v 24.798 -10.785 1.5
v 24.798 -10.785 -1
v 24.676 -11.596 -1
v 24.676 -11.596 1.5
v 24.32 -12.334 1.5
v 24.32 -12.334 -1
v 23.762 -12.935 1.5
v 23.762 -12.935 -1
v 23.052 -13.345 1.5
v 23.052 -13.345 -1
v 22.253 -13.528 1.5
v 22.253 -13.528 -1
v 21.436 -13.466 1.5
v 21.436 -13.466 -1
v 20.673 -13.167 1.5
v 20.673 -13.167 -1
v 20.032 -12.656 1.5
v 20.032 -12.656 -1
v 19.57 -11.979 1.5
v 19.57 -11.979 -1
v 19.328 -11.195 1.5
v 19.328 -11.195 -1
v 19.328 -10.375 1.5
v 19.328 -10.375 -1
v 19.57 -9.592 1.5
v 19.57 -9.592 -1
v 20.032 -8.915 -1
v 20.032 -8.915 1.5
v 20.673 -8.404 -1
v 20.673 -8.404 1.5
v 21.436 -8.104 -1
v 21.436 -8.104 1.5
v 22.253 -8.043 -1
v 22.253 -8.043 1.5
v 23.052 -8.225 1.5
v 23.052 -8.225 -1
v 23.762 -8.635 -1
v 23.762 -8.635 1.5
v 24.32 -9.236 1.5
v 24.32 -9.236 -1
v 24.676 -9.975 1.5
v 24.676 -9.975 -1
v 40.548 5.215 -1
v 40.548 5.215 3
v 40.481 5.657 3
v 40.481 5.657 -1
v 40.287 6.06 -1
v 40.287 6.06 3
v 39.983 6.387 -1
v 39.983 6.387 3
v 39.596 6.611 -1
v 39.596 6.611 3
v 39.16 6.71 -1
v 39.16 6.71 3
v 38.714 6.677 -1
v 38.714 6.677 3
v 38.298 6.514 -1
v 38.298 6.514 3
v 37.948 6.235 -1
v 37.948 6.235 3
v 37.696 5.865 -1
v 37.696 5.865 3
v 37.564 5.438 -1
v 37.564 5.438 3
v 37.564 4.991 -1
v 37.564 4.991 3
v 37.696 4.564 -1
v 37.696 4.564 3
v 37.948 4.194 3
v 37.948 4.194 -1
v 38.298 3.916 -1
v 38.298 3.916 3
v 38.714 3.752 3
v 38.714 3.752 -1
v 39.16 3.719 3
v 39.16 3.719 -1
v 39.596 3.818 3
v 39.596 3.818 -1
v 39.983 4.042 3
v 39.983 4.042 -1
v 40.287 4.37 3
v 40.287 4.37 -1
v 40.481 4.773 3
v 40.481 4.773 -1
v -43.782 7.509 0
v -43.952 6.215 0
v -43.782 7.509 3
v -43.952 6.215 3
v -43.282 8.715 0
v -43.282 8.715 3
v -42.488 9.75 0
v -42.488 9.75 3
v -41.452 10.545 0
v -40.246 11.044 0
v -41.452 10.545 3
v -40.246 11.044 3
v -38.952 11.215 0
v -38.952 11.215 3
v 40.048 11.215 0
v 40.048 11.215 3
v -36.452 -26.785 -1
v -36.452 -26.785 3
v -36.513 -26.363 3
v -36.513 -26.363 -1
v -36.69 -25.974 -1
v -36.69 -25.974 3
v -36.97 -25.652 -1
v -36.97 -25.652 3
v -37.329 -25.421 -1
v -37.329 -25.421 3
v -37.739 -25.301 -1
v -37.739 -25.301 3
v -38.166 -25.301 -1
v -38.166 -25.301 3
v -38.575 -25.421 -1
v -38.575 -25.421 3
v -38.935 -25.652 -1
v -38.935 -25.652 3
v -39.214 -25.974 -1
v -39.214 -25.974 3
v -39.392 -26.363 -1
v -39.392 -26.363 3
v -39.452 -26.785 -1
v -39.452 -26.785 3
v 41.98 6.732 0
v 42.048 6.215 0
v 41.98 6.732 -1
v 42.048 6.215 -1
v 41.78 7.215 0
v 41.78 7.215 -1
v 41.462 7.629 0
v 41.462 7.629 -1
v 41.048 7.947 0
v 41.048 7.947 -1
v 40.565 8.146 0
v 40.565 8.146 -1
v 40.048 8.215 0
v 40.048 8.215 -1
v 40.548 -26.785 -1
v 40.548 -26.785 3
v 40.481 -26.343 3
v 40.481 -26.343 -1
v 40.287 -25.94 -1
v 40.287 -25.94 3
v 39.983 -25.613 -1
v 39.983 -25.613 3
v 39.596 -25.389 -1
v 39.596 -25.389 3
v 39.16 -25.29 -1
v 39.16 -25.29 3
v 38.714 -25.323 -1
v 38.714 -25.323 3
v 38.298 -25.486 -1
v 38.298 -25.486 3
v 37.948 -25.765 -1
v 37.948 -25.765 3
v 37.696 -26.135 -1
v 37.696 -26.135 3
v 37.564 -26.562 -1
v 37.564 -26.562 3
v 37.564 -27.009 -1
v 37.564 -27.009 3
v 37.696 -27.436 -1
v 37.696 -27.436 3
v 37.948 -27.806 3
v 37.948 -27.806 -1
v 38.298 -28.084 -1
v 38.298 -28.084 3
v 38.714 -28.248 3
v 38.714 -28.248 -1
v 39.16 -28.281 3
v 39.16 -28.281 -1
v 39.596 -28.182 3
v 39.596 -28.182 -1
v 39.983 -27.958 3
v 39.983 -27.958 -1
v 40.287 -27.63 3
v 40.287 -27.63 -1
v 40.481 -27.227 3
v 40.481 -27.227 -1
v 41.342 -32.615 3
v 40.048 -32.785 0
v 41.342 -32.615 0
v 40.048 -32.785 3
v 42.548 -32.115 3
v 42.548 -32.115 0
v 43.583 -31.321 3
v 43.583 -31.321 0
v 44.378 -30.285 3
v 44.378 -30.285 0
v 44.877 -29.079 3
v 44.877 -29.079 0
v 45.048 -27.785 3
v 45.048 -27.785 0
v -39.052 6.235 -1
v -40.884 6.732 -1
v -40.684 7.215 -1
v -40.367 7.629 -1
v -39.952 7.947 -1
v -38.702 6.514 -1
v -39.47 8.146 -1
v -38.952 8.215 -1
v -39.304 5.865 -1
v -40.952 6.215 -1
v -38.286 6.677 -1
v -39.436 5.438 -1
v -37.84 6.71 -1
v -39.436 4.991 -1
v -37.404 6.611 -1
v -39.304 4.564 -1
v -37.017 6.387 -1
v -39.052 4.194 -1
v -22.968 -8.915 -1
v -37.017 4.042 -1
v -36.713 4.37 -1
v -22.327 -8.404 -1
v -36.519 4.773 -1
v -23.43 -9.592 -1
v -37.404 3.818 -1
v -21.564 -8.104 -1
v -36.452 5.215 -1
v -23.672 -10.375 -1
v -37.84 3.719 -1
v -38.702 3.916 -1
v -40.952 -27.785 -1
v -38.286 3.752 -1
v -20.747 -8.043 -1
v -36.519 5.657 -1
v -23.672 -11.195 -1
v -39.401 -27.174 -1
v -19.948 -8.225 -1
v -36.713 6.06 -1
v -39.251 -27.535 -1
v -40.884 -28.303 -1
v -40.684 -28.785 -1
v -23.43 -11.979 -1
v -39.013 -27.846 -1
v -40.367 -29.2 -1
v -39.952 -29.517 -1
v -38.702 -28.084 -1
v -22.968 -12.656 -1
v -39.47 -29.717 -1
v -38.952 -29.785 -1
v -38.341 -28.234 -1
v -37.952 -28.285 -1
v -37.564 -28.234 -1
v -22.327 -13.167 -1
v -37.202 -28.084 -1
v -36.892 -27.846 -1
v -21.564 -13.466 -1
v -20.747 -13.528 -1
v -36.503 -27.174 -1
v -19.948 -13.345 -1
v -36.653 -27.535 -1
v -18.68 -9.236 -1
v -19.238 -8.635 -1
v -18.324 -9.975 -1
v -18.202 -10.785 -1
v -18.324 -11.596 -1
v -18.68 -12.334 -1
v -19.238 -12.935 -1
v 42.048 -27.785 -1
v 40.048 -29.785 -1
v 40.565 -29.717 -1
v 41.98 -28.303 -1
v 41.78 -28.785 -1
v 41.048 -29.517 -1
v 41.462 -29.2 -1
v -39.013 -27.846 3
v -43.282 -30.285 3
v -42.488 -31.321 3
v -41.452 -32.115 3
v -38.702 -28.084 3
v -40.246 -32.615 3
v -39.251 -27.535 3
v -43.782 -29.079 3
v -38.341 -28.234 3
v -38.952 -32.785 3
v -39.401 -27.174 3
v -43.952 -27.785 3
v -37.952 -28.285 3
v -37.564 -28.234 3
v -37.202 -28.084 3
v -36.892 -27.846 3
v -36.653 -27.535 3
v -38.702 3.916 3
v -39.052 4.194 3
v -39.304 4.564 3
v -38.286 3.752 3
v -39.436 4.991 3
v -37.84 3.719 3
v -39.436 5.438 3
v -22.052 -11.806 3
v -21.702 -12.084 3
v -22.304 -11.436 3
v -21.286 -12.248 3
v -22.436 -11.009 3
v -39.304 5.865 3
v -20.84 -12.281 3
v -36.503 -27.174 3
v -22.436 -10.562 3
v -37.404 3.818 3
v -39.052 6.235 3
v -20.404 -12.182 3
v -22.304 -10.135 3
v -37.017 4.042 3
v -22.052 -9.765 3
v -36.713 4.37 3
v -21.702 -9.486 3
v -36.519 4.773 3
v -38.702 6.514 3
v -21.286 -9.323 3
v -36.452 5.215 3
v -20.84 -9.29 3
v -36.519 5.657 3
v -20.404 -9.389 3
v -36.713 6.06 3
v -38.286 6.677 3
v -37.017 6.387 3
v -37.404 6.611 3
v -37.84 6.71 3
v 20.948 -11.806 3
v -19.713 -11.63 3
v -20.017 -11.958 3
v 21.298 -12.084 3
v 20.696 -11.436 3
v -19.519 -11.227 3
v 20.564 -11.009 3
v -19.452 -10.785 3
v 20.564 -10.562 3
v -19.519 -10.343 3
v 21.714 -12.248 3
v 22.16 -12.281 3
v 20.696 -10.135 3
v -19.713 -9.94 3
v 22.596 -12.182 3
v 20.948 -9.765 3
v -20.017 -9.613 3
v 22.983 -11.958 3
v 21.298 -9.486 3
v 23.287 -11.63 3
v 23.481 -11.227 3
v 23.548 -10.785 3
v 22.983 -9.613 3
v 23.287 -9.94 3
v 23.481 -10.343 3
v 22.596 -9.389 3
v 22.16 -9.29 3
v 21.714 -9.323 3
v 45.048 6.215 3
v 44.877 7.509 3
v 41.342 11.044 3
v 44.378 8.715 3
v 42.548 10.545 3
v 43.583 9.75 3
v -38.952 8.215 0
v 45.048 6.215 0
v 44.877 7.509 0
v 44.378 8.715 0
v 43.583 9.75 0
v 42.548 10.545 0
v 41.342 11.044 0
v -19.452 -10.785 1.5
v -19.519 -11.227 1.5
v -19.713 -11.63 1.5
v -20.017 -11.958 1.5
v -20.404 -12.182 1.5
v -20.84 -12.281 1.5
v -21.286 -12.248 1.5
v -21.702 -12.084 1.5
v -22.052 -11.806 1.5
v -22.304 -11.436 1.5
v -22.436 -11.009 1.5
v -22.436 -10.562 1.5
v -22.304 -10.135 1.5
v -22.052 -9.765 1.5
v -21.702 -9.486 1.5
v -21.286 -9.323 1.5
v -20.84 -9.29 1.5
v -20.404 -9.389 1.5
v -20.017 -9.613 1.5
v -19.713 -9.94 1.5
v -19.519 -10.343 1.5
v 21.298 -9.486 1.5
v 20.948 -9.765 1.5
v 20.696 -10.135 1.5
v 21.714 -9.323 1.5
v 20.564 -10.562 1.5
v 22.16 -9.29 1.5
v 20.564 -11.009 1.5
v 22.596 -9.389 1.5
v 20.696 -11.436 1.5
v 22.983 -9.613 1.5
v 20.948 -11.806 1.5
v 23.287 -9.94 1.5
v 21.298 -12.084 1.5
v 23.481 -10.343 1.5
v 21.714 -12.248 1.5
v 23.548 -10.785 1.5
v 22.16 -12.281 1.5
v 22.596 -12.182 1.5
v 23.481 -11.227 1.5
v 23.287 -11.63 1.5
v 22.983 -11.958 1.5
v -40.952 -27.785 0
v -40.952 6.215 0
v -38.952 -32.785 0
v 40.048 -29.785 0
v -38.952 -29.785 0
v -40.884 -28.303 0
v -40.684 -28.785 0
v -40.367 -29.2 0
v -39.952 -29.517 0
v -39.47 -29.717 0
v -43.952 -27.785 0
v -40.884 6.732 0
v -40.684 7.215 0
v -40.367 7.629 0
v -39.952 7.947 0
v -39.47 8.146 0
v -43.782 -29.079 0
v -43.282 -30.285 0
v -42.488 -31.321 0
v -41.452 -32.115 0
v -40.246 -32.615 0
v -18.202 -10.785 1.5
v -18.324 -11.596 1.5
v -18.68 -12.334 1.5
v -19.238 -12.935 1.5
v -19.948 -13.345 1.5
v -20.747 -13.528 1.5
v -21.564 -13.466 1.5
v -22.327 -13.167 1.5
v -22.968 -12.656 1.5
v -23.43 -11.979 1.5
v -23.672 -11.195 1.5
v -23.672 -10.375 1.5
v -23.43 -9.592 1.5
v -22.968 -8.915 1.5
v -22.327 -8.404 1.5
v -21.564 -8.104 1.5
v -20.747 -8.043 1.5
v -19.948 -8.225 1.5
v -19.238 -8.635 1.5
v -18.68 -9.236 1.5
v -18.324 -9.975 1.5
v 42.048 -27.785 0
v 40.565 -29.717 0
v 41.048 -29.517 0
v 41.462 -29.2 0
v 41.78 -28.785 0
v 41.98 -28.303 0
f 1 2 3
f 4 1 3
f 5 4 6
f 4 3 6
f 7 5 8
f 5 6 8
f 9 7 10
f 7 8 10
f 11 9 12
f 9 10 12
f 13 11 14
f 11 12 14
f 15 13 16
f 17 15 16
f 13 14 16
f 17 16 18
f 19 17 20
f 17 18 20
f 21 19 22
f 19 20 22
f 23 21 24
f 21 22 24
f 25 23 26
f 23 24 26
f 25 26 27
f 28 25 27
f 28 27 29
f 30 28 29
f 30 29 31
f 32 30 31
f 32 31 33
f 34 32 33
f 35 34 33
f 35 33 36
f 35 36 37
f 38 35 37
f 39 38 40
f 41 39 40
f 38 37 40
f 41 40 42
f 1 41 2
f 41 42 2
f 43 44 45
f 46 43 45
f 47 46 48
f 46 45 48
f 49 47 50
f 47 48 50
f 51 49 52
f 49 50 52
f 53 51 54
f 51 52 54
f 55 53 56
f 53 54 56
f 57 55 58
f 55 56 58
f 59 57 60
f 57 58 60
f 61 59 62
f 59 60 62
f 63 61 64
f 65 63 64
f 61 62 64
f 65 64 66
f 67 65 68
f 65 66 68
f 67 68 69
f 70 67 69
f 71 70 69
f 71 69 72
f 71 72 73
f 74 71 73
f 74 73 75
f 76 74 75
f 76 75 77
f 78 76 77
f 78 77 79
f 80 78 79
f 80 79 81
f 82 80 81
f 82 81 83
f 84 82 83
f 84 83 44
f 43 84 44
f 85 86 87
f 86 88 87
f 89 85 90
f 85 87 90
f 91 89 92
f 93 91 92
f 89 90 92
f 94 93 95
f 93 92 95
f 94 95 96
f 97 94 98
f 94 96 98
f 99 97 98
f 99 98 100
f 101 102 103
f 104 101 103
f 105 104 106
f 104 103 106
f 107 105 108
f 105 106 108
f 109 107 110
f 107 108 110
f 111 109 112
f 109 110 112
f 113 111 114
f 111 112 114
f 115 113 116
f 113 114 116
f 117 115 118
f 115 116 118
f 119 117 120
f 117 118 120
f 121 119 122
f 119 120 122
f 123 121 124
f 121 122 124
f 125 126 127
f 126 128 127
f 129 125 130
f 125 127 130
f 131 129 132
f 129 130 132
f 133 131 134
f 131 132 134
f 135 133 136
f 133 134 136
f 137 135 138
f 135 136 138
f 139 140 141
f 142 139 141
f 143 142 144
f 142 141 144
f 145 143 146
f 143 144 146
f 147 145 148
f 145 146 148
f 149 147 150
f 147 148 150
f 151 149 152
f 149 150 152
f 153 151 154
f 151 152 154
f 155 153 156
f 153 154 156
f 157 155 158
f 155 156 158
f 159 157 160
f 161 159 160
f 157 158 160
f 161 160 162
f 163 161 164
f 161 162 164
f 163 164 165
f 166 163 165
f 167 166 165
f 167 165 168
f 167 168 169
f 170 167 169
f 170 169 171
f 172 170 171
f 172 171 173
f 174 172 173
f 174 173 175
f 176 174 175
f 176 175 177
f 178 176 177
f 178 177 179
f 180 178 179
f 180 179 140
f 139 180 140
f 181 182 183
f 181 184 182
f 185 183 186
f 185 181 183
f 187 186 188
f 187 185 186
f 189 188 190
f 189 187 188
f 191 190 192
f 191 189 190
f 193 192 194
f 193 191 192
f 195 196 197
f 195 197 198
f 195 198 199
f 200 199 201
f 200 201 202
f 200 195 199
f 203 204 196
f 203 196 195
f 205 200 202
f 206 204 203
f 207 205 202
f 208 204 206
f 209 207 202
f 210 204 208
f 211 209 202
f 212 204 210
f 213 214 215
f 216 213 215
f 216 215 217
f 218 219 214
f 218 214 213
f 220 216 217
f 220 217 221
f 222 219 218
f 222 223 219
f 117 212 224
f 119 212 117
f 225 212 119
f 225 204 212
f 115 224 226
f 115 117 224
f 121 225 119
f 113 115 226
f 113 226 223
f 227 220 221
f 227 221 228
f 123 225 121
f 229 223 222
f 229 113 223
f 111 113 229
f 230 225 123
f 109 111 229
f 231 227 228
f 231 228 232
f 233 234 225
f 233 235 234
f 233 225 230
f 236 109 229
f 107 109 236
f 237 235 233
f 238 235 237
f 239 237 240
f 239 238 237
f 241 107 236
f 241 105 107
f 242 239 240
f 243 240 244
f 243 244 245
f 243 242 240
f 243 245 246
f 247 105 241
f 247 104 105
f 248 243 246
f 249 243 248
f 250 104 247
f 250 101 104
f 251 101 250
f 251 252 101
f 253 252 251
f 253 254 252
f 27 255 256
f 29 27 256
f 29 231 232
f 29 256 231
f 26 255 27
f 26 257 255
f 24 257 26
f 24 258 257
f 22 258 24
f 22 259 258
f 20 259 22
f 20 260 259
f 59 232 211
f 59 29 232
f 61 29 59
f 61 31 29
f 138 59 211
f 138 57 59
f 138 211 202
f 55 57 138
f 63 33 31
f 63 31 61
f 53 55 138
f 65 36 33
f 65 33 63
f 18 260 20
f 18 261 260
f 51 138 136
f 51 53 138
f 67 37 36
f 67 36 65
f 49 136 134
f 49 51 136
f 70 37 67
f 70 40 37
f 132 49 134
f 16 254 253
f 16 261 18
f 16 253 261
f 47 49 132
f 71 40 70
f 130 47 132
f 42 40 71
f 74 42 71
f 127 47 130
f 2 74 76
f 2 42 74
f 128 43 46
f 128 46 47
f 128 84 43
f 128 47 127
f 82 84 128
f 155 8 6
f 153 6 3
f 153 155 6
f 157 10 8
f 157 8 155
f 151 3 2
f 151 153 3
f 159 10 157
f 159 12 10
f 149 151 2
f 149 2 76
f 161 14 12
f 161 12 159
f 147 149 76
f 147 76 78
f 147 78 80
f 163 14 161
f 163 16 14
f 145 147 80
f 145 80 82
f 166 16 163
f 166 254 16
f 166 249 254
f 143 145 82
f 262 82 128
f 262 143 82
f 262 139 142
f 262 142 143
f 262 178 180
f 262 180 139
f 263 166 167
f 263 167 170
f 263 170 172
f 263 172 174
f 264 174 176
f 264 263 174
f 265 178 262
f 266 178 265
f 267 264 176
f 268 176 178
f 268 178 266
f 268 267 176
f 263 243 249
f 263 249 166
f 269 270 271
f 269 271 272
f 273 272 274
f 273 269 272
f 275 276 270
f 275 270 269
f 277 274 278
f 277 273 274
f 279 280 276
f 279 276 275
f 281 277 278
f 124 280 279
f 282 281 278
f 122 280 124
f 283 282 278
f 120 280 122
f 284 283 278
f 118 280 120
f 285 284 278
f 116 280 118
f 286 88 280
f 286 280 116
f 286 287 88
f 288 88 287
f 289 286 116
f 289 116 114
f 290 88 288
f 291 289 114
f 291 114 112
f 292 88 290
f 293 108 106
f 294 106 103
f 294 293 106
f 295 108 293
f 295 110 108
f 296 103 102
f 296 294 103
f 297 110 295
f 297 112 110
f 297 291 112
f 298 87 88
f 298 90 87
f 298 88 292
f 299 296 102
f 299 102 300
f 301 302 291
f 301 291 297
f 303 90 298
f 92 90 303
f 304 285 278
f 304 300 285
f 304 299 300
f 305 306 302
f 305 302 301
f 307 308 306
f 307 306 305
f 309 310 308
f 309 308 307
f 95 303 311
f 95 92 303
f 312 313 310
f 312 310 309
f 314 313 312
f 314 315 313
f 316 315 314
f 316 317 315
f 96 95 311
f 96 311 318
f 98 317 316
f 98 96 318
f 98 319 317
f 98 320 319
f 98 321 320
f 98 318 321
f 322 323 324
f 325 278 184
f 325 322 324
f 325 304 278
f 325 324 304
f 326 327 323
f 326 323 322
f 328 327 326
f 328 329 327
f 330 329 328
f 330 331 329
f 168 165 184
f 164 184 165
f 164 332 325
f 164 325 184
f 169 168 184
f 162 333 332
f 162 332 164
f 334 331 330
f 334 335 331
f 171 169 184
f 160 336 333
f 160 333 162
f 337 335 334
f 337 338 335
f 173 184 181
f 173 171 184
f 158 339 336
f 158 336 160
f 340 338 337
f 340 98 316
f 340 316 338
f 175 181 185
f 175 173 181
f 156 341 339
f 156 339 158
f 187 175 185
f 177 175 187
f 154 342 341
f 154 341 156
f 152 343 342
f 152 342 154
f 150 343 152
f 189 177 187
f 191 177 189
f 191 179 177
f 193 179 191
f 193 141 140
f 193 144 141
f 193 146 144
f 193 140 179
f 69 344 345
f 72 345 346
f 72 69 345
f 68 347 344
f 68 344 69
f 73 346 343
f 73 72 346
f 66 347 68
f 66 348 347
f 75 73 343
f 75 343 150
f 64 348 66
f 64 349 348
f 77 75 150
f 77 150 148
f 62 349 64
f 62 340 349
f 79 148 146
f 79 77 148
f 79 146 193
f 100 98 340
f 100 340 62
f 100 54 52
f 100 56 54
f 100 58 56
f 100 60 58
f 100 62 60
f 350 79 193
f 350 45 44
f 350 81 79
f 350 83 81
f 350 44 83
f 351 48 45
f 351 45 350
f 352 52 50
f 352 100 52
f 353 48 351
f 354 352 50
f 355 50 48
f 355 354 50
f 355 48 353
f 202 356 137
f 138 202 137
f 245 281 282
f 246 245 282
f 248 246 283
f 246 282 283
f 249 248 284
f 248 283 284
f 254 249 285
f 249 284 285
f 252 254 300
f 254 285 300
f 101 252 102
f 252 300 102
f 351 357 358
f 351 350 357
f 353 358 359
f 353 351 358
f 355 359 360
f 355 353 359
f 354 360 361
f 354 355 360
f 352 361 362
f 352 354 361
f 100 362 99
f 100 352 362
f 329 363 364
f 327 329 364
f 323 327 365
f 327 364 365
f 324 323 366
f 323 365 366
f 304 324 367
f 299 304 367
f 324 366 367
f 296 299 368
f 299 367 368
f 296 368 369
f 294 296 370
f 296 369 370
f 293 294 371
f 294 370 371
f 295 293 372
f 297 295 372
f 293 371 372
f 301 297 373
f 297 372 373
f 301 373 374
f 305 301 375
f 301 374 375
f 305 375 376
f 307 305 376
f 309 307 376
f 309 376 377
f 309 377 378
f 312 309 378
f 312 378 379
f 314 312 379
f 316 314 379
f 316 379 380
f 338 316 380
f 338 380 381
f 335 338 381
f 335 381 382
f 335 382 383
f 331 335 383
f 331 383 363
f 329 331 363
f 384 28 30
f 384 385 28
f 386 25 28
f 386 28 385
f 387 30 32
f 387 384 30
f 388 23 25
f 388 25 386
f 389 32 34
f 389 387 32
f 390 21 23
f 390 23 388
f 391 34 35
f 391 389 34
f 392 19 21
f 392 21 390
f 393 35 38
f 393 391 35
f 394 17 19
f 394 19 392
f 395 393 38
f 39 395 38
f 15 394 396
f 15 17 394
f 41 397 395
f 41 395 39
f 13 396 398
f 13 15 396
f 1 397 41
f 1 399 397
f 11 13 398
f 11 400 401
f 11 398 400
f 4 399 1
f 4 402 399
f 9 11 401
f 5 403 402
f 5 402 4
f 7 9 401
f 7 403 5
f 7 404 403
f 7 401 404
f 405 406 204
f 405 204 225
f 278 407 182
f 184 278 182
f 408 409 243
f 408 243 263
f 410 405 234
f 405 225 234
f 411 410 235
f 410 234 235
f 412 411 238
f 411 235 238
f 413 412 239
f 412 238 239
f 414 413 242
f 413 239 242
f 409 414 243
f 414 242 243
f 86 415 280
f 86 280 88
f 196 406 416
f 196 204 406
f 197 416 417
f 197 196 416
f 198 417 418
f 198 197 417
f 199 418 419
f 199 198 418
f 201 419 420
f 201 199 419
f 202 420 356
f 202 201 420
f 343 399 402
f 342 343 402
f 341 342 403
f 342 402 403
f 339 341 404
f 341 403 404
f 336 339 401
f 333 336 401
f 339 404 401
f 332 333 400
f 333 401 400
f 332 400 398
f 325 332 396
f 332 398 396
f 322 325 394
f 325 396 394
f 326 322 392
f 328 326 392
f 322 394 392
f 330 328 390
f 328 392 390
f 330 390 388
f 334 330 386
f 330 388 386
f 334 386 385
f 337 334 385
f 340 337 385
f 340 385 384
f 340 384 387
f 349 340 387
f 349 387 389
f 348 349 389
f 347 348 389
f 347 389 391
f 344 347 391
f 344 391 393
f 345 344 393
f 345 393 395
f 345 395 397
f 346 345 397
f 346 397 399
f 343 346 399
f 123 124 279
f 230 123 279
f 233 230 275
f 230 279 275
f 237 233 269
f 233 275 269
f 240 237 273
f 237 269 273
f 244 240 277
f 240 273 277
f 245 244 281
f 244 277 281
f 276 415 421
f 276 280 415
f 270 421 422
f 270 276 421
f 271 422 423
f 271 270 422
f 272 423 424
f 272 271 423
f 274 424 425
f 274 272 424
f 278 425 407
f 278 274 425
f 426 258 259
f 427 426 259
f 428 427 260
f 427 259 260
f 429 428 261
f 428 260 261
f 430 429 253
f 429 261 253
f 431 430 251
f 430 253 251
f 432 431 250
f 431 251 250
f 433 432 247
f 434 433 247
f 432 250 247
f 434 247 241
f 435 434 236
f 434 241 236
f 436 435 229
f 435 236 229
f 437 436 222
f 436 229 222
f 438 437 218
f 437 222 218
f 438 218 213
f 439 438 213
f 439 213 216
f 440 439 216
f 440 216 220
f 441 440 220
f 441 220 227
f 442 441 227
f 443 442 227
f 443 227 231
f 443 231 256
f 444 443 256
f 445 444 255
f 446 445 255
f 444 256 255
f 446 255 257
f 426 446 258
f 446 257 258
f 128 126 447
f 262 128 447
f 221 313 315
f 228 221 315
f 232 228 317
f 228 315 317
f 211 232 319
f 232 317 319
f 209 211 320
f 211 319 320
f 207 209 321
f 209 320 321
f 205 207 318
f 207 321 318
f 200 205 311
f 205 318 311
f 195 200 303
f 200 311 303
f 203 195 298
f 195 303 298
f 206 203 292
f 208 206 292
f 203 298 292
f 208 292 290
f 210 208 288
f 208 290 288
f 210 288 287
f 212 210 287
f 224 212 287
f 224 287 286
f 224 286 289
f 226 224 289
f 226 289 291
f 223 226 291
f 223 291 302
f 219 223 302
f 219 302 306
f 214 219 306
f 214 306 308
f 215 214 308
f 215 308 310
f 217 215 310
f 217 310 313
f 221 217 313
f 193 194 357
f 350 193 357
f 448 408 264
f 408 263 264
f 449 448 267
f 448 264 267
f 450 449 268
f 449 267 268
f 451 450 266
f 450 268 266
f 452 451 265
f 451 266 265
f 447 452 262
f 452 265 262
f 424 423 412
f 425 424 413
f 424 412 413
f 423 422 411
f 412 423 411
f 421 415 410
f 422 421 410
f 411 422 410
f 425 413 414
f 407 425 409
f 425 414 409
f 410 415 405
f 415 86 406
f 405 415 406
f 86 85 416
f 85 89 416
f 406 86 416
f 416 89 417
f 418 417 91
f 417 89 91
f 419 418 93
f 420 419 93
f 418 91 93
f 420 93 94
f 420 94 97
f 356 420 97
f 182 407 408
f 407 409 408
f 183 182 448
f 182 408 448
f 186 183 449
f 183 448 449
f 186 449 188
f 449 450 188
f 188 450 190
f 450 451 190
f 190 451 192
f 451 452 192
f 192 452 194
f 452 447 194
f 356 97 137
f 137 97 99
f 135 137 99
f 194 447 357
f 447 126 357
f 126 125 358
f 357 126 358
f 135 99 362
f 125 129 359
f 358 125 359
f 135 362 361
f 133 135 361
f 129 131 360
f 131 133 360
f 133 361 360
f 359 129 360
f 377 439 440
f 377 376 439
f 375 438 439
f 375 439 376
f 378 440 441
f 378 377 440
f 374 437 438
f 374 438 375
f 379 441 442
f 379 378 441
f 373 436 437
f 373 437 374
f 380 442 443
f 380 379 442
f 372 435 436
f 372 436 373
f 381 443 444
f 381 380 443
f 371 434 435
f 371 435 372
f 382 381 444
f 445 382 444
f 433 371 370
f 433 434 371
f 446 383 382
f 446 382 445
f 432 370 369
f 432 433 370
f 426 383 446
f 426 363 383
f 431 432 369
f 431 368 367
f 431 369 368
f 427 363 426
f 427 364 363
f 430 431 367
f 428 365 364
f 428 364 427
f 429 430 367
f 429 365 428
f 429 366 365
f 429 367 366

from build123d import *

# Parameters (mm, degrees)
F0_W      = 89
F0_H      = 44
F0_W_2    = 85
F0_H_2    = 40
F1_DEPTH  = 3
F2_R      = 5
F3_W      = 83
F3_H      = 38
F4_DEPTH  = 1
F5_R      = 2
F6_R      = 1.5
F7_DEPTH  = 25
F8_R      = 2.75
F9_DEPTH  = 2.5
F10_R     = 1.5
F11_DEPTH = 25


with BuildPart() as f1:
    # F0 (on Top) → F1 (new body)
    with BuildSketch(Plane.XY):
        with Locations((0.5476979613, -10.7853626366)):
            Rectangle(F0_W, F0_H)
        with Locations((0.5476979613, -10.7853626366)):
            Rectangle(F0_W_2, F0_H_2, mode=Mode.SUBTRACT)
        with Locations((0.5476979613, -10.7853626366)):
            Rectangle(F0_W_2, F0_H_2)
    extrude(amount=F1_DEPTH)

    # F2
    f2_edges = [f1.edges().sort_by_distance(p)[0] for p in [
        (-43.952302, 11.214637, 1.5),
        (45.047698, 11.214637, 1.5),
        (45.047698, -32.785363, 1.5),
        (-43.952302, -32.785363, 1.5),
    ]]
    fillet(f2_edges, radius=F2_R)

    # F3 (on face) → F4 (join)
    with BuildSketch(Plane(origin=(0, 0, 0), x_dir=(1, 0, 0), z_dir=(0, 0, -1))):
        with Locations((0.5476979613, 10.7853626366)):
            Rectangle(F3_W, F3_H)
    extrude(amount=F4_DEPTH)

    # F5
    f5_edges = [f1.edges().sort_by_distance(p)[0] for p in [
        (-40.952302, -29.785363, -0.5),
        (-40.952302, 8.214637, -0.5),
        (42.047698, 8.214637, -0.5),
        (42.047698, -29.785363, -0.5),
    ]]
    fillet(f5_edges, radius=F5_R)

    # F6 (on face) → F7 (cut)
    with BuildSketch(Plane(origin=(0, 0, -1), x_dir=(1, 0, 0), z_dir=(0, 0, -1))):
        with Locations((22.0476979613, 10.7853626366)):
            Circle(F6_R)
        with BuildLine():
            ThreePointArc((-22.4523020387, 10.7853626366), (-20.9523020387, 9.2853626366), (-19.4523020387, 10.7853626366))
            ThreePointArc((-19.4523020387, 10.7853626366), (-20.9523020387, 12.2853626366), (-22.4523020387, 10.7853626366))
        make_face()
    extrude(amount=-F7_DEPTH, mode=Mode.SUBTRACT)

    # F8 (on face) → F9 (cut)
    with BuildSketch(Plane(origin=(0, 0, -1), x_dir=(1, 0, 0), z_dir=(0, 0, -1))):
        with Locations((-20.9523020387, 10.7853626366)):
            Circle(F8_R)
        with Locations((22.0476979613, 10.7853626366)):
            Circle(F8_R)
    extrude(amount=-F9_DEPTH, mode=Mode.SUBTRACT)

    # F10 (on face) → F11 (cut)
    with BuildSketch(Plane.XY.offset(3)):
        with BuildLine():
            ThreePointArc((-36.4523020387, -26.7853626366), (-37.9523020387, -25.2853626366), (-39.4523020387, -26.7853626366))
            Line((-39.4523020387, -26.7853626366), (-37.9523020387, -26.7853626366))
            Line((-37.9523020387, -26.7853626366), (-37.9523020387, -28.2853626366))
            ThreePointArc((-37.9523020387, -28.2853626366), (-36.8916418669, -27.8460228084), (-36.4523020387, -26.7853626366))
        make_face()
        with BuildLine():
            Line((-37.9523020387, -26.7853626366), (-39.4523020387, -26.7853626366))
            ThreePointArc((-39.4523020387, -26.7853626366), (-39.0129622104, -27.8460228084), (-37.9523020387, -28.2853626366))
            Line((-37.9523020387, -28.2853626366), (-37.9523020387, -26.7853626366))
        make_face()
        with Locations((-37.9523020387, 5.2146373634)):
            Circle(F10_R)
        with Locations((39.0476979613, -26.7853626366)):
            Circle(F10_R)
        with Locations((39.0476979613, 5.2146373634)):
            Circle(F10_R)
    extrude(amount=-F11_DEPTH, mode=Mode.SUBTRACT)


solid = f1.part
